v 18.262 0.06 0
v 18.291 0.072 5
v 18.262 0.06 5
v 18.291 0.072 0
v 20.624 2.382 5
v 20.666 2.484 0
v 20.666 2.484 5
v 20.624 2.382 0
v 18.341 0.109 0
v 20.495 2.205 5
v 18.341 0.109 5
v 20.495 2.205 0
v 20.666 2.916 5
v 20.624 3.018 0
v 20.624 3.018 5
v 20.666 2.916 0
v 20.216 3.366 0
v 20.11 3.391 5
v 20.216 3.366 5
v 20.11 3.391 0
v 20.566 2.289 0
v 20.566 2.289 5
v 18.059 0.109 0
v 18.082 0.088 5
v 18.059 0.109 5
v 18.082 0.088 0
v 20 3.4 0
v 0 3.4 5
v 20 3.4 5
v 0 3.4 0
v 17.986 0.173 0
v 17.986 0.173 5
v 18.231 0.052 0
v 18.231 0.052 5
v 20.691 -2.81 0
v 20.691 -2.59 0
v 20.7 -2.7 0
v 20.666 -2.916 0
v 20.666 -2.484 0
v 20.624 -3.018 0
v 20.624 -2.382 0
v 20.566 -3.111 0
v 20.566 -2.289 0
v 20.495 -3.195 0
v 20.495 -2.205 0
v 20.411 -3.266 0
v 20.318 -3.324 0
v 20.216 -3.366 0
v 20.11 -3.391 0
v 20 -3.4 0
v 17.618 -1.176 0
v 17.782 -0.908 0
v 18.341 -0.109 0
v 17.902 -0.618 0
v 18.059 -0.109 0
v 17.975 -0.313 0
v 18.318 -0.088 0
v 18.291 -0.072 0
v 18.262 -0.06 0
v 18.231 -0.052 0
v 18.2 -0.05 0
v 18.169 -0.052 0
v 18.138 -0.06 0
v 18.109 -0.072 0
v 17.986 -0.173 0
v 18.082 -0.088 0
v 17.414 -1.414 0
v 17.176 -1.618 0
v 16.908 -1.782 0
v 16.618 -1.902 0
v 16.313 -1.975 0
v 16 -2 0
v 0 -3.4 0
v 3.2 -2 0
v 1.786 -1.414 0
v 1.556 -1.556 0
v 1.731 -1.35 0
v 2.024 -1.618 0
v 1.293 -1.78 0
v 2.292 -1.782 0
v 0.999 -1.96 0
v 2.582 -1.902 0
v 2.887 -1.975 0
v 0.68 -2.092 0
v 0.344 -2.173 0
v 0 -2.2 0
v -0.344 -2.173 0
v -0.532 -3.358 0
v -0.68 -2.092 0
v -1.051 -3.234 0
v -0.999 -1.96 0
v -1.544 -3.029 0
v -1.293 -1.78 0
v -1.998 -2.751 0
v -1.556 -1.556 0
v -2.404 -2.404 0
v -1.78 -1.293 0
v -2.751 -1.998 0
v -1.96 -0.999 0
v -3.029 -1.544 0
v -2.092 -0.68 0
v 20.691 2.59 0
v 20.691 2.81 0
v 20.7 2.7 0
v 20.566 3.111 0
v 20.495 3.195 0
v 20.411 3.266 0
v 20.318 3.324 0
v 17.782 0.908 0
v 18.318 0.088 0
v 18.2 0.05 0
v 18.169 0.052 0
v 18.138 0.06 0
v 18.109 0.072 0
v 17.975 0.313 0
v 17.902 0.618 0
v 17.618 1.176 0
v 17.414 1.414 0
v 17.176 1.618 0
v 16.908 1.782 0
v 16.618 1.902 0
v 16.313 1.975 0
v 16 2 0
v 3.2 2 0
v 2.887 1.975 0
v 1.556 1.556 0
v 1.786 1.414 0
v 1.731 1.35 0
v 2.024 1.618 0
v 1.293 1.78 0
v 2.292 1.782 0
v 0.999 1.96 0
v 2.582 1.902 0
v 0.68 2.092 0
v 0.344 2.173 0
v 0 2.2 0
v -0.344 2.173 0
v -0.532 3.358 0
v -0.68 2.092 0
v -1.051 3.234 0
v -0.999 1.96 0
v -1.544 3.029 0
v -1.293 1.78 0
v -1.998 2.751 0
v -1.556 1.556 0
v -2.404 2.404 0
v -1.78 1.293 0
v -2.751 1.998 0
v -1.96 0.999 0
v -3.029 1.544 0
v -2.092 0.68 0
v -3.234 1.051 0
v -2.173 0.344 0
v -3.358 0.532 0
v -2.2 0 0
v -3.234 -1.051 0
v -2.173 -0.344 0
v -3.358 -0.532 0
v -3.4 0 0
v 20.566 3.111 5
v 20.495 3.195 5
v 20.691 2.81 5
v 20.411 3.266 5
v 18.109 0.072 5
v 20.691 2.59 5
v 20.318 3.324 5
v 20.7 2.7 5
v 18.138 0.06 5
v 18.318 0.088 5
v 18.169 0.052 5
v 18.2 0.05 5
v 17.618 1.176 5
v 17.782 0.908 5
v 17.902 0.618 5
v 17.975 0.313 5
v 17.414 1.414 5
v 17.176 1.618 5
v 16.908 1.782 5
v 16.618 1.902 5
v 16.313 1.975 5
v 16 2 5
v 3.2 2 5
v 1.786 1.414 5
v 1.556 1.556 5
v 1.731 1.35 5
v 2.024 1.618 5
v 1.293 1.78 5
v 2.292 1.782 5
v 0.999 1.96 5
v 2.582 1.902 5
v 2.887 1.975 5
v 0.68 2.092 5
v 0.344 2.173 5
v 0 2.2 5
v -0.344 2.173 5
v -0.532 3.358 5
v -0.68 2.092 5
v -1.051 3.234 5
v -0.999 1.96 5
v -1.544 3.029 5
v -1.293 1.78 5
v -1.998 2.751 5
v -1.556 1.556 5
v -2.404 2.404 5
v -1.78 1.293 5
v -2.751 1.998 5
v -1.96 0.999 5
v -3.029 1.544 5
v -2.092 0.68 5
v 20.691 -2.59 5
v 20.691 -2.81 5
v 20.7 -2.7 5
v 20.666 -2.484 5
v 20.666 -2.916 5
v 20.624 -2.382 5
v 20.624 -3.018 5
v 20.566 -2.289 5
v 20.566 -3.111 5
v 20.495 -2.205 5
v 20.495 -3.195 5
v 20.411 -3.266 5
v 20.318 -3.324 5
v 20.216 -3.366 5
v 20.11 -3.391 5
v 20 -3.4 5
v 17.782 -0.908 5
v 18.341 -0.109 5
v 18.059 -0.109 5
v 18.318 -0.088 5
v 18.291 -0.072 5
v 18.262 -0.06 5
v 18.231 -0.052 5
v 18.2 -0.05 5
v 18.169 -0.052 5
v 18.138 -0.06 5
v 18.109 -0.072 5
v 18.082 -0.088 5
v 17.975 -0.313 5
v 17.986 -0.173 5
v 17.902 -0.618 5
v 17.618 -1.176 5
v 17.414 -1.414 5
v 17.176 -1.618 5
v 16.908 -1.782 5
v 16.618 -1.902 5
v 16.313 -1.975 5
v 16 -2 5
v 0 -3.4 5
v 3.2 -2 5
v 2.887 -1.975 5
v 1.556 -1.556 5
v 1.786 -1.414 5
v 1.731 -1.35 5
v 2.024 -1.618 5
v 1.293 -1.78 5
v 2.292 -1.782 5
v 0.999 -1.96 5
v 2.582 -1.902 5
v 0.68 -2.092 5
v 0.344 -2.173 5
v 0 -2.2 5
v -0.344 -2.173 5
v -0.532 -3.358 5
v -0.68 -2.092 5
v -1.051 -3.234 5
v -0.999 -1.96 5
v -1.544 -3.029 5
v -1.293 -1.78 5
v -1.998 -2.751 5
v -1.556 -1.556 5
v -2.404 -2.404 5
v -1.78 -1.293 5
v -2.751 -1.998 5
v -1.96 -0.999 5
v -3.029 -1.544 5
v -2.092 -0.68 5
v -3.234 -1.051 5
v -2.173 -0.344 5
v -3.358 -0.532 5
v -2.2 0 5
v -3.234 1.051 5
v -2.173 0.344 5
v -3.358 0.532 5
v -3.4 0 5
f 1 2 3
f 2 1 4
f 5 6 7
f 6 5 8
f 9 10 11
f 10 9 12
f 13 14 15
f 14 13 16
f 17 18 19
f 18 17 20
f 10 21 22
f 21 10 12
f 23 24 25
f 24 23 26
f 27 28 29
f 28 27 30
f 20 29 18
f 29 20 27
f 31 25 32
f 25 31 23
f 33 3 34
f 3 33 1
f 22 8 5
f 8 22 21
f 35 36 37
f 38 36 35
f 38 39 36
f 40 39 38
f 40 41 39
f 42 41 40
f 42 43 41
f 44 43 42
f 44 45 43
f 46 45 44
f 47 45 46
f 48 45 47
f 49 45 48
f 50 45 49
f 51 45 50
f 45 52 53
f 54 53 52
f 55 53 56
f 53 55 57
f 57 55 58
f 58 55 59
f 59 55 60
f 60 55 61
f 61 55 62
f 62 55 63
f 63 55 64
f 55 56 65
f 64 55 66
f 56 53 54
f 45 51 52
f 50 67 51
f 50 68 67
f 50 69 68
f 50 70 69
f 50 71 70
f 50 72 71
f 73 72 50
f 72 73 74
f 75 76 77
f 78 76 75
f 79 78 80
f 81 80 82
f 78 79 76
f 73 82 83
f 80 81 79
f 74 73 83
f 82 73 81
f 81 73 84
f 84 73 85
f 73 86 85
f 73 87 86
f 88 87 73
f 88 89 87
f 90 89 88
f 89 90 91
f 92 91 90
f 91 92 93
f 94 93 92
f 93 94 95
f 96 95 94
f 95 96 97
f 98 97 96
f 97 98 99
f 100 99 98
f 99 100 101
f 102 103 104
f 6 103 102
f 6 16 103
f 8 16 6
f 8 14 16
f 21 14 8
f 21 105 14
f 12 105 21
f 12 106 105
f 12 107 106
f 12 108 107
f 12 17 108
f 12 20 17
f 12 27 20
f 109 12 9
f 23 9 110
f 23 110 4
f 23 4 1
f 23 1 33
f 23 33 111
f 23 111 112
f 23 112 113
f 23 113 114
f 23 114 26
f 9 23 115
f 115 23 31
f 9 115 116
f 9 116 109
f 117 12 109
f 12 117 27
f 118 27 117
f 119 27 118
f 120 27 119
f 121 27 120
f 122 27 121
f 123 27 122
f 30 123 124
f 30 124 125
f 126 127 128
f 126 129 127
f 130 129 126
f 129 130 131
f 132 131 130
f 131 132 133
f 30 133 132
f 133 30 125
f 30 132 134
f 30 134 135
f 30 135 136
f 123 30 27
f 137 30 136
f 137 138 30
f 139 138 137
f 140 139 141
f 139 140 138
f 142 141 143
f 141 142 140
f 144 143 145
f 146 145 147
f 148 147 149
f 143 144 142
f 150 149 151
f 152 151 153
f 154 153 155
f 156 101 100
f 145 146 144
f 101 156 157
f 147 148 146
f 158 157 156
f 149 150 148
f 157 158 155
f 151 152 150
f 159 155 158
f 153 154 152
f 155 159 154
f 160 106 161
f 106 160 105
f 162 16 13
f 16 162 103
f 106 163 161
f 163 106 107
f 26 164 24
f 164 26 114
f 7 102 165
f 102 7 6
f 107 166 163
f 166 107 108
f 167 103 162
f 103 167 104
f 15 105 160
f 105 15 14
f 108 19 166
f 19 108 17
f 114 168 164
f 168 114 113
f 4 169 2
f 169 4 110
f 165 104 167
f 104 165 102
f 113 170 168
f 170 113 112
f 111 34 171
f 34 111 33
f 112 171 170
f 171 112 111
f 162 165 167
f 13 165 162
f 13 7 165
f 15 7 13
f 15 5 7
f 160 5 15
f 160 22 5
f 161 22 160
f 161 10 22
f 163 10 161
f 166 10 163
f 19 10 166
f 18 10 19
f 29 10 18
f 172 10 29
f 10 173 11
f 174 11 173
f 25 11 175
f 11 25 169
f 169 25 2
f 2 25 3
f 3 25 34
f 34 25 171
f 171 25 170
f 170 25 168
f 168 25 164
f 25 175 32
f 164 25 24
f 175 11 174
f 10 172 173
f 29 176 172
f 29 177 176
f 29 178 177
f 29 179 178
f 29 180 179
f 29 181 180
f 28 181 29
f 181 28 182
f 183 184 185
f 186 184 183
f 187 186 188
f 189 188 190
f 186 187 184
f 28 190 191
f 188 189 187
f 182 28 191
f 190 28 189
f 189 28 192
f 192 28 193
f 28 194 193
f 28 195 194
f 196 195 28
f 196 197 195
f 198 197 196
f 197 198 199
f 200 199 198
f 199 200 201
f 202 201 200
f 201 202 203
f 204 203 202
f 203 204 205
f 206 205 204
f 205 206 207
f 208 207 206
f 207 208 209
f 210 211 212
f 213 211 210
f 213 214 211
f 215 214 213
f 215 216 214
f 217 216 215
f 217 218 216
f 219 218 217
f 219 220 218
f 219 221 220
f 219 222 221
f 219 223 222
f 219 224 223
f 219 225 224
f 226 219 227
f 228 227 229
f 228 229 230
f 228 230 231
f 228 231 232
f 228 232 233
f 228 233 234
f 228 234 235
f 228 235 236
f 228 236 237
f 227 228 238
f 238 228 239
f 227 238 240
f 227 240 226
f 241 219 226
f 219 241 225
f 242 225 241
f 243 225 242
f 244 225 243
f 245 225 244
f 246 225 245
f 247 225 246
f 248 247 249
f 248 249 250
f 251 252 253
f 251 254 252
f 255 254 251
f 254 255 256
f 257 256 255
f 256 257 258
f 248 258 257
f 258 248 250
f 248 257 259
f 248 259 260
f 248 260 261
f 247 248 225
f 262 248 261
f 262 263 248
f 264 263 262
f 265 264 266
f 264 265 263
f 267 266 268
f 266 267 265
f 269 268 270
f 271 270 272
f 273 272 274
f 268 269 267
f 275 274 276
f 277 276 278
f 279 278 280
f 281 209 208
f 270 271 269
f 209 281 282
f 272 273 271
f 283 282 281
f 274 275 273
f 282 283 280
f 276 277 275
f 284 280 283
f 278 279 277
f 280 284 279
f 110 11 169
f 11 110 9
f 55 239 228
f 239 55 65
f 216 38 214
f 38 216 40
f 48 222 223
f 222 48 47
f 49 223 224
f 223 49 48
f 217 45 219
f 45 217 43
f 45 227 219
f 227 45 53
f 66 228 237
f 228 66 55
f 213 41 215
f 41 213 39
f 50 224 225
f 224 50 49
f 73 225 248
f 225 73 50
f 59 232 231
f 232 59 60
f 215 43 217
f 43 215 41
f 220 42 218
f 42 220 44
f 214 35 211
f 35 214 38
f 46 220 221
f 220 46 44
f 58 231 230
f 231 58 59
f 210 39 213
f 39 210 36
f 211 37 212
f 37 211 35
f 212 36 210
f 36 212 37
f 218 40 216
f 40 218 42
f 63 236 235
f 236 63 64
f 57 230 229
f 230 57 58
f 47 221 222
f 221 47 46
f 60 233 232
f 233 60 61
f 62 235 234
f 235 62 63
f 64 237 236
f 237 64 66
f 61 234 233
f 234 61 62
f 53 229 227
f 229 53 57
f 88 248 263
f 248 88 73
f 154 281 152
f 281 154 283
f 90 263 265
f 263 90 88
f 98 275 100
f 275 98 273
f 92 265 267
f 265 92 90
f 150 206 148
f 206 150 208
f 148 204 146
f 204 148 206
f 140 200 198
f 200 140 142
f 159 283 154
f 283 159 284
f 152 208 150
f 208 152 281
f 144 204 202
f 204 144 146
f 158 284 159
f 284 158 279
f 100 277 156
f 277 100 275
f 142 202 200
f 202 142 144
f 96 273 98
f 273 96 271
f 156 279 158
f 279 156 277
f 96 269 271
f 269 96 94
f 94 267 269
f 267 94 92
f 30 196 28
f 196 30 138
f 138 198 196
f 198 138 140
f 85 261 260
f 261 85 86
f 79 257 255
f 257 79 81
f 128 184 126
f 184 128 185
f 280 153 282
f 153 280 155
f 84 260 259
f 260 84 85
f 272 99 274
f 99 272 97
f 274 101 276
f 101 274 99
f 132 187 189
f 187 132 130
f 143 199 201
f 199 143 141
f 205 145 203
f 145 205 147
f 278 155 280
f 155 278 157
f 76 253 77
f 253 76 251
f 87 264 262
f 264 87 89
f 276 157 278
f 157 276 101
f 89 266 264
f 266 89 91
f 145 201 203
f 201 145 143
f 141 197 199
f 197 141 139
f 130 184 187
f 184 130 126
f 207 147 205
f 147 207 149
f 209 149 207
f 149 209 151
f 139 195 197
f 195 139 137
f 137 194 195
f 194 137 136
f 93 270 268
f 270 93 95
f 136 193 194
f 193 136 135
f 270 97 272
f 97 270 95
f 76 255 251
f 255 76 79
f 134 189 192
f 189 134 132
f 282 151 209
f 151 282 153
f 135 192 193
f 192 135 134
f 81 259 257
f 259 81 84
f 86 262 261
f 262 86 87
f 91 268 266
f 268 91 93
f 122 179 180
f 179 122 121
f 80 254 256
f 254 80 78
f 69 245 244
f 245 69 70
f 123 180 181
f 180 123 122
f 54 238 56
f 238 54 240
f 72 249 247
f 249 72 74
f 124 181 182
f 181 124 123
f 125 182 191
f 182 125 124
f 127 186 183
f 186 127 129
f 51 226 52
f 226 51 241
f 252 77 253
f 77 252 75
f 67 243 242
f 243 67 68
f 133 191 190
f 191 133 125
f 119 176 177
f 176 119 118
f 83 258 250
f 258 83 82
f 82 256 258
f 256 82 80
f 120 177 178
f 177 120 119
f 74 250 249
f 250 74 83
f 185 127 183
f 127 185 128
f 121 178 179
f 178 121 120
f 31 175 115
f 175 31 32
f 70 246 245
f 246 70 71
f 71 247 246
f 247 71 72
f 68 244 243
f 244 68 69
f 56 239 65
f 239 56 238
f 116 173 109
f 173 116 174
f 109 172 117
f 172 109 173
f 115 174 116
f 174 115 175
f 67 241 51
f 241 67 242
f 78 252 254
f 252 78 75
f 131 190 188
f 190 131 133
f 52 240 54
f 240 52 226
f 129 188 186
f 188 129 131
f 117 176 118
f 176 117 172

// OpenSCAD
// Cable Thickness (mm)
g_cable_d = 4; // [1:0.1:6]

// Cable Loops
g_cable_loops = 5; // [2:10]

// Clip Thickness
g_clip_thickness = 1.2; // [1.2:0.4:3.2]

// Below are not customizer vars.
module __Customizer_Limit__ () {}

$fn=40;

// Clip Height
g_clip_height = 5;

module clip(cable_d, cable_loops, clip_thickness, clip_height, debug=false) {
    cutout_height = clip_height + 0.1;
    cutout_translate = [0,0,-0.05];
    
    if (debug) {
        // Loops:
        #color("blue") loops(cable_d, cable_loops, clip_thickness, clip_height);
    }
    
    difference() {
        hinge_finangle = 0.4;
        // Adding a value to the clip_thickness so it becomes "minimum" clip thickness
        // due to the slightly enlarged hinge cutout:
        outer_shape(cable_d, cable_loops, clip_thickness + hinge_finangle/2, clip_height, debug);
        
        translate(cutout_translate) {
            // The first cutout is slightly bigger - allows sliding, and means
            // if the tolerances are tight the hinge won't be wedged slightly open.
            cylinder(d=cable_d + hinge_finangle, h=cutout_height);
            hull() {
                translate([cable_d * 0.8,0,0]) cylinder(d=cable_d, h=cutout_height);
                translate([cable_d * (cable_loops-1),0,0]) cylinder(d=cable_d, h=cutout_height);
            }
        }
    }
}

module outer_shape(cable_d, cable_loops, clip_thickness, clip_height, debug) {
    cable_r = cable_d / 2;
    
    // Outer Shell:
    union() {
        hull() {
            cylinder(r=cable_r + clip_thickness, h=clip_height);
            translate([cable_d * (cable_loops - 1), 0, 0])
                translate([0,-(cable_r + clip_thickness),0])
                cube([0.0001, 2 * (cable_r + clip_thickness), clip_height]);
                //cylinder(r=cable_r + clip_thickness, h=clip_height);
            
        }

        translate([cable_d * (cable_loops - 1), 0, 0]) {
            // Top Triangle:
            triangle(cable_d, clip_thickness, clip_height);
        
            // Bottom Triangle:
            translate([0,0,clip_height])
            rotate([180, 0, 0])
                triangle(cable_d, clip_thickness, clip_height);
        }
    }
}

module triangle(cable_d, clip_thickness, clip_height) {
    cable_r = cable_d / 2;

    triangle_corner = 0.2;  // Radius of most of the triangle points
    end_corner = clip_thickness / 2; // Divided by two because it's a radius
    clip_ease = cable_d; // "Pointiness of clip arms
    finangle = 0.05; // Just move the touching parts away, so they're not joined.

    hull() {
            translate([0, cable_r + clip_thickness - triangle_corner, 0])
                cylinder(r=triangle_corner, h=clip_height);
            translate([0, cable_r + triangle_corner, 0])
                cylinder(r=triangle_corner, h=clip_height);
            // Inside point:
            translate([cable_r + triangle_corner, triangle_corner + finangle, 0])
                cylinder(r=triangle_corner, h=clip_height);
            // This is the pointy-end:
            translate([clip_ease, cable_r + clip_thickness - end_corner, 0])
                cylinder(r=end_corner, h=clip_height);
        }
    }

module loops(cable_d, cable_loops, clip_thickness, clip_height) {
    height = clip_height + 1;
    for (loop = [0 : cable_loops - 1]) {
        translate([cable_d * loop,0,-0.5])
            cylinder(d=cable_d, h=height, $fn=20);
    }
}

clip(g_cable_d, g_cable_loops, g_clip_thickness, g_clip_height);
